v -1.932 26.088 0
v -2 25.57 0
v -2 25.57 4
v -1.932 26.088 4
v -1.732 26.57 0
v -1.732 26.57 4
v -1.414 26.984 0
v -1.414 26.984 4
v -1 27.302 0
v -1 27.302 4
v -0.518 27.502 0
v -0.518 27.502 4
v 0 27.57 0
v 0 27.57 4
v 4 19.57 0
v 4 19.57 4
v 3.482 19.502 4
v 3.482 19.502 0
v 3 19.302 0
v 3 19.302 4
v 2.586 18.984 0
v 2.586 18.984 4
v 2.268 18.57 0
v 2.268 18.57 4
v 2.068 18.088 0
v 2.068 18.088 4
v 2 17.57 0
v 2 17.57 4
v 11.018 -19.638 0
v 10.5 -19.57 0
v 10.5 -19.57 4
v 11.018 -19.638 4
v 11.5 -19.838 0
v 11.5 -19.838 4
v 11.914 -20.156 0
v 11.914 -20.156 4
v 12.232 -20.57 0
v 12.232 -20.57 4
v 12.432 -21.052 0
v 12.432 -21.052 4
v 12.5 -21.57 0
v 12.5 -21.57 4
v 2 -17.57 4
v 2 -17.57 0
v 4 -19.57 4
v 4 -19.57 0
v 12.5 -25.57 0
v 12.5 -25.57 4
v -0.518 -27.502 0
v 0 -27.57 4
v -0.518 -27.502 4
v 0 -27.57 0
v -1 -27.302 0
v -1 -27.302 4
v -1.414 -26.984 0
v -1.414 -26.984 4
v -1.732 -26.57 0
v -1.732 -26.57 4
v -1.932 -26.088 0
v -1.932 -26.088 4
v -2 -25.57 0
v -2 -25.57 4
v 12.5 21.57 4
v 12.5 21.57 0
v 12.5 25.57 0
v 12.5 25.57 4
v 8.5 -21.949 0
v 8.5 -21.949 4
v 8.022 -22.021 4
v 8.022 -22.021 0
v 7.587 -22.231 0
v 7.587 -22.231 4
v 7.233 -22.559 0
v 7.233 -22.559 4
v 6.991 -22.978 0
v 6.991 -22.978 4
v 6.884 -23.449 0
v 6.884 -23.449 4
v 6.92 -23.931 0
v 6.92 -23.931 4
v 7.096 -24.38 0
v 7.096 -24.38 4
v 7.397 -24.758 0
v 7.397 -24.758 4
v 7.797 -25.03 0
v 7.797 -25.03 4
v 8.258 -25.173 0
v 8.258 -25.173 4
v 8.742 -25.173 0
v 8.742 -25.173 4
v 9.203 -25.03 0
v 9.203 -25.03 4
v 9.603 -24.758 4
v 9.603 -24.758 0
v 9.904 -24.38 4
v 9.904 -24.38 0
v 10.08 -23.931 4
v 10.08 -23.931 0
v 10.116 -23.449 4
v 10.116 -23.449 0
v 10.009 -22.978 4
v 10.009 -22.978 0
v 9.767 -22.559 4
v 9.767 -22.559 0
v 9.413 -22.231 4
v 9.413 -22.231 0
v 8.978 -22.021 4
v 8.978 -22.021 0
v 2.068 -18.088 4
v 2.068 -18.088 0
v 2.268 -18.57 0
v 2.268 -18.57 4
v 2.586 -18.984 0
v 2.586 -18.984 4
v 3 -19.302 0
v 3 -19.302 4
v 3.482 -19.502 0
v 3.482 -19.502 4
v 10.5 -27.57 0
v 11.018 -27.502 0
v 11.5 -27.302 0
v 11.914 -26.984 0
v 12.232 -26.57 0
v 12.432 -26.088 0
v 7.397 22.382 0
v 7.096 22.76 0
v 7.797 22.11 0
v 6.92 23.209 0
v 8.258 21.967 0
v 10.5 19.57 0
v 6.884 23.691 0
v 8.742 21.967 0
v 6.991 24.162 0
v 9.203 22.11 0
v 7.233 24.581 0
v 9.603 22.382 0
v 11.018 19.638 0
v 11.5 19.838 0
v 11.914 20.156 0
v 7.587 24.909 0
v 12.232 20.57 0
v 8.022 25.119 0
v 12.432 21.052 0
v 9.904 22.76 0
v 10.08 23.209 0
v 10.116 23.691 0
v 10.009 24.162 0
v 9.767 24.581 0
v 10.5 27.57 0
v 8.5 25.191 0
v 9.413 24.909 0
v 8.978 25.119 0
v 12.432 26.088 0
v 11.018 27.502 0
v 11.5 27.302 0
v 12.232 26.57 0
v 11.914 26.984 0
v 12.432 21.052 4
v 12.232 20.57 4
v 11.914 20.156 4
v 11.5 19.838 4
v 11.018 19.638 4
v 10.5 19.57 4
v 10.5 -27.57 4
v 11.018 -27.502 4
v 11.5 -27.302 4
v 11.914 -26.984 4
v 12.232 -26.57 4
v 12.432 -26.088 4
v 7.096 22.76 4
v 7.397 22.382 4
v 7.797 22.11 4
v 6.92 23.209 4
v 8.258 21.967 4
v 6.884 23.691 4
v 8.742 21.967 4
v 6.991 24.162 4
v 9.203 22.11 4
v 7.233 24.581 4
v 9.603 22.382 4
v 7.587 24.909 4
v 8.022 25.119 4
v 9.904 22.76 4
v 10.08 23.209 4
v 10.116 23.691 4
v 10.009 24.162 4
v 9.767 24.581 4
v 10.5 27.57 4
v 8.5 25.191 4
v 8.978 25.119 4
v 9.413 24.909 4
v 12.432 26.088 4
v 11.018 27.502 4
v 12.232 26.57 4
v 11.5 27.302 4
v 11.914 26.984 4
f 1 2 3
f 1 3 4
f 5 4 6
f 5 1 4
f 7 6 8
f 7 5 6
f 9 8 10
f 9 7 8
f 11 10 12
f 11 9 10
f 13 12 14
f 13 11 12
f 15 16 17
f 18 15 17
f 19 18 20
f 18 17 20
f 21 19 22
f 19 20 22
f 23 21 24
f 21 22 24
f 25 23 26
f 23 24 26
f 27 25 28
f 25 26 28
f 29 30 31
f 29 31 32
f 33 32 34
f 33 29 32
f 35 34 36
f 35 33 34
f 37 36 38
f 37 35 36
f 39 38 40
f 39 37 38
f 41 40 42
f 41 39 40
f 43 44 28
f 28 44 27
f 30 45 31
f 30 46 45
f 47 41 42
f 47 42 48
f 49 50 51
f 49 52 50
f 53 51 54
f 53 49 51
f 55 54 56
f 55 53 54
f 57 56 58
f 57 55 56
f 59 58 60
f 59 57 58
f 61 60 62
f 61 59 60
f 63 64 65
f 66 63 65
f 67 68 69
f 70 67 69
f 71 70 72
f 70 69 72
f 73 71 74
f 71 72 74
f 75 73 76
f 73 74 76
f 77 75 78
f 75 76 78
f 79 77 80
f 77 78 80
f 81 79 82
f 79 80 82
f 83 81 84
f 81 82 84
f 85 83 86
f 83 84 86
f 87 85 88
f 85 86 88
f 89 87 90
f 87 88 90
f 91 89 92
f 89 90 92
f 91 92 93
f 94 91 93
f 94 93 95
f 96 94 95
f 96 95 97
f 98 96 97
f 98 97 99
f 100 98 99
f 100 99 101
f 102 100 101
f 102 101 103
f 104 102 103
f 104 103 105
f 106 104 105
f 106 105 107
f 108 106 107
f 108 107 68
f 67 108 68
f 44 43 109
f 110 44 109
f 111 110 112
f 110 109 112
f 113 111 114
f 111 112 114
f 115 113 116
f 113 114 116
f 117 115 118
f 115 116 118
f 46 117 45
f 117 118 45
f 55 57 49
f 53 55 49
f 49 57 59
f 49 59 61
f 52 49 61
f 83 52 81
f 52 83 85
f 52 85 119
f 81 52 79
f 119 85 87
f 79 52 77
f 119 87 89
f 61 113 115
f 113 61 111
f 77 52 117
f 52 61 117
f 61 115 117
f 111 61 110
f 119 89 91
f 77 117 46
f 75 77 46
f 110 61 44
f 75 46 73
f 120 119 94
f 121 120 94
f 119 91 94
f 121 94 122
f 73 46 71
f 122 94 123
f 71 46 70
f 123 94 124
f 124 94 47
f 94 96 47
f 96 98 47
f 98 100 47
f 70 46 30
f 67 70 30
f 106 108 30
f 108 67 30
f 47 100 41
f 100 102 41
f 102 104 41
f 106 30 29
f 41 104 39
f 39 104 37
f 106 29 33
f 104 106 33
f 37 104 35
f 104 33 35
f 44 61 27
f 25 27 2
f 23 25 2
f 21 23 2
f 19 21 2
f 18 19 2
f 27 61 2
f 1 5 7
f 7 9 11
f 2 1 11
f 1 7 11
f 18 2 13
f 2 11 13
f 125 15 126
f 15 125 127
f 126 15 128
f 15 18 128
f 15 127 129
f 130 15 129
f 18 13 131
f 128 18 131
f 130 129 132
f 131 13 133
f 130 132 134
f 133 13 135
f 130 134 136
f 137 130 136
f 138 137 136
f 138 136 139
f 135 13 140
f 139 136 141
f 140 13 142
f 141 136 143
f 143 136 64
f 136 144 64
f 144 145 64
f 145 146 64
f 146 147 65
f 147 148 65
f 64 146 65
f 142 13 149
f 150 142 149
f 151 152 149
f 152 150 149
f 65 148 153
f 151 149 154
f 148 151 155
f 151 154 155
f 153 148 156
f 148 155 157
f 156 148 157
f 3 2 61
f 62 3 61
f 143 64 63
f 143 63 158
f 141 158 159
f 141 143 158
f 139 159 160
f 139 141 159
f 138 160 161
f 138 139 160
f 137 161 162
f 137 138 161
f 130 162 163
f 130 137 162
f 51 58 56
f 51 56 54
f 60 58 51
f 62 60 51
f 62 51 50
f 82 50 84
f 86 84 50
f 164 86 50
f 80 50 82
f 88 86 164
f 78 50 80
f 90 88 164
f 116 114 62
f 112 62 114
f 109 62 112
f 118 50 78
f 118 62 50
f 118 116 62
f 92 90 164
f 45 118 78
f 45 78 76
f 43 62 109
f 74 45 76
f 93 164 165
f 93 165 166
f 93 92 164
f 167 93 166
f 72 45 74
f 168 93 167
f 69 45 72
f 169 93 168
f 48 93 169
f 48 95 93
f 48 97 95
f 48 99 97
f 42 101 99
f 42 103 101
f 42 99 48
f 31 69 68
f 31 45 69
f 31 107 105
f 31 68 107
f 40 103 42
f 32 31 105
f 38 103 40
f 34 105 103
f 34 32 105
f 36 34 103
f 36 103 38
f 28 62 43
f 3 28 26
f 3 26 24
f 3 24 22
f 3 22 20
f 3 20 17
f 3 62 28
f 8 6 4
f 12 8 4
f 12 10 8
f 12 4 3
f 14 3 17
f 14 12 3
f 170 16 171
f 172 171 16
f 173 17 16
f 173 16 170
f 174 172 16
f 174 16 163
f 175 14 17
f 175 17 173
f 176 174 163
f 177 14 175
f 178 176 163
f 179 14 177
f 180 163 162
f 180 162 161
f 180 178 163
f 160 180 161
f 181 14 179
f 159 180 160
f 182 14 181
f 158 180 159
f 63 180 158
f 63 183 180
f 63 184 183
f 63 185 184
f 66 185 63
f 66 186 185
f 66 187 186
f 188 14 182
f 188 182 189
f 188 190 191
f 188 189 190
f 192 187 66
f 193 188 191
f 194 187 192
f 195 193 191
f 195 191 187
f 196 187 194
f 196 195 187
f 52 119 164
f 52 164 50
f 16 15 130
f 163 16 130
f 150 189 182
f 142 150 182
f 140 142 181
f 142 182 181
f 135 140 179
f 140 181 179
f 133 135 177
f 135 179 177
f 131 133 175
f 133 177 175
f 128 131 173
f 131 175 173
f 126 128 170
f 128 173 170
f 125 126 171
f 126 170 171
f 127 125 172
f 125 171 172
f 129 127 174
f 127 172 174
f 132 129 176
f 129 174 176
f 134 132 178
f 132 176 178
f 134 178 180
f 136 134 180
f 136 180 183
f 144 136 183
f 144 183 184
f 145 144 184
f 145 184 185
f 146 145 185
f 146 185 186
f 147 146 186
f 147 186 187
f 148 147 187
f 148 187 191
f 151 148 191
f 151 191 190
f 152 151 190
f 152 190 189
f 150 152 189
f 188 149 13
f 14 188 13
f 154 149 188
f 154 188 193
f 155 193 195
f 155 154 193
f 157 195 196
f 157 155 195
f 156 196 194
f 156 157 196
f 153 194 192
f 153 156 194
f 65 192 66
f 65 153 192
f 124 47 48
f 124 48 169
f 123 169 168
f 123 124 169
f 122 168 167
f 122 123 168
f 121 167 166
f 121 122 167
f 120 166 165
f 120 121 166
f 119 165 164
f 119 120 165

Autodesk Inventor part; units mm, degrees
ref_plane "YZ Plane" through (0, 0, 0) normal (1, 0, 0) x (0, 1, 0)
ref_plane "XZ Plane" through (0, 0, 0) normal (0, 1, 0) x (-1, 0, 0)
ref_plane "XY Plane" through (0, 0, 0) normal (0, 0, 1) x (1, 0, 0)
sketch "Skizze1" plane through (0, 0, 0) normal (0, 0, 1) x (1, 0, 0)
  line L0 (-2, -19.57) -> (2, -19.57)
  line L1 (2, -19.57) -> (2, 19.57)
  line L2 (2, 19.57) -> (-2, 19.57)
  line L3 (-2, 19.57) -> (-2, -19.57)
  line L4 (-2, -19.57) -> (2, 19.57) construction
  line L5 (2, -19.57) -> (-2, 19.57) construction
  line L6 (-2, 19.57) -> (10.5, 19.57)
  line L7 (12.5, 21.57) -> (12.5, 25.57)
  line L8 (10.5, 27.57) -> (0, 27.57)
  line L9 (-2, 25.57) -> (-2, 19.57)
  line L10 (-2, -19.57) -> (10.5, -19.57)
  line L11 (12.5, -21.57) -> (12.5, -25.57)
  line L12 (10.5, -27.57) -> (0, -27.57)
  line L13 (-2, -25.57) -> (-2, -19.57)
  line L14 (8.5, -23.57) -> (8.5, 23.57) construction
  circle A0 centre (8.5, -23.57) radius 4 construction
  circle A1 centre (8.5, 23.57) radius 4 construction
  circle A2 centre (8.5, 23.57) radius 2
  arc A3 (12.5, 25.57) -> (10.5, 27.57) centre (10.5, 25.57) ccw
  arc A4 (10.5, 19.57) -> (12.5, 21.57) centre (10.5, 21.57) ccw
  arc A5 (0, 27.57) -> (-2, 25.57) centre (0, 25.57) ccw
  arc A6 (-2, -25.57) -> (0, -27.57) centre (0, -25.57) ccw
  arc A7 (10.5, -27.57) -> (12.5, -25.57) centre (10.5, -25.57) ccw
  arc A8 (12.5, -21.57) -> (10.5, -19.57) centre (10.5, -21.57) ccw
  point P0 (0, 0)
  point P1 (12.5, -27.57)
  dimension "d0" = 47.14
  dimension "d1" = 6.5
  dimension "d2" = 4
  dimension "d3" = 8
  dimension "d4" = 4
  dimension "d5" = 2
extrude "Extrusion1" add sketch "Skizze1" along normal blind 4 contours L3 L2 L1 L0 | L0 L10 A8 L11 A7 L12 A6 L13 | L9 A5 L8 A3 L7 A4 L6 L2 | A2
hole "Bohrung1" at (8.5, 23.57, 0) at (8.5, -23.57, 0) direction (0, 0, 1) diameter 3.242 depth 11.8 tip angle 118 thread size "M4x0.7" class "6H" standard "ANSI Metric M Profile"
fillet "Rundung1" radius 2 2 edges at (2, -19.57, 2) (2, 19.57, 2)
properties part number "Nema23_24Mount" material "Aluminium 6061"
